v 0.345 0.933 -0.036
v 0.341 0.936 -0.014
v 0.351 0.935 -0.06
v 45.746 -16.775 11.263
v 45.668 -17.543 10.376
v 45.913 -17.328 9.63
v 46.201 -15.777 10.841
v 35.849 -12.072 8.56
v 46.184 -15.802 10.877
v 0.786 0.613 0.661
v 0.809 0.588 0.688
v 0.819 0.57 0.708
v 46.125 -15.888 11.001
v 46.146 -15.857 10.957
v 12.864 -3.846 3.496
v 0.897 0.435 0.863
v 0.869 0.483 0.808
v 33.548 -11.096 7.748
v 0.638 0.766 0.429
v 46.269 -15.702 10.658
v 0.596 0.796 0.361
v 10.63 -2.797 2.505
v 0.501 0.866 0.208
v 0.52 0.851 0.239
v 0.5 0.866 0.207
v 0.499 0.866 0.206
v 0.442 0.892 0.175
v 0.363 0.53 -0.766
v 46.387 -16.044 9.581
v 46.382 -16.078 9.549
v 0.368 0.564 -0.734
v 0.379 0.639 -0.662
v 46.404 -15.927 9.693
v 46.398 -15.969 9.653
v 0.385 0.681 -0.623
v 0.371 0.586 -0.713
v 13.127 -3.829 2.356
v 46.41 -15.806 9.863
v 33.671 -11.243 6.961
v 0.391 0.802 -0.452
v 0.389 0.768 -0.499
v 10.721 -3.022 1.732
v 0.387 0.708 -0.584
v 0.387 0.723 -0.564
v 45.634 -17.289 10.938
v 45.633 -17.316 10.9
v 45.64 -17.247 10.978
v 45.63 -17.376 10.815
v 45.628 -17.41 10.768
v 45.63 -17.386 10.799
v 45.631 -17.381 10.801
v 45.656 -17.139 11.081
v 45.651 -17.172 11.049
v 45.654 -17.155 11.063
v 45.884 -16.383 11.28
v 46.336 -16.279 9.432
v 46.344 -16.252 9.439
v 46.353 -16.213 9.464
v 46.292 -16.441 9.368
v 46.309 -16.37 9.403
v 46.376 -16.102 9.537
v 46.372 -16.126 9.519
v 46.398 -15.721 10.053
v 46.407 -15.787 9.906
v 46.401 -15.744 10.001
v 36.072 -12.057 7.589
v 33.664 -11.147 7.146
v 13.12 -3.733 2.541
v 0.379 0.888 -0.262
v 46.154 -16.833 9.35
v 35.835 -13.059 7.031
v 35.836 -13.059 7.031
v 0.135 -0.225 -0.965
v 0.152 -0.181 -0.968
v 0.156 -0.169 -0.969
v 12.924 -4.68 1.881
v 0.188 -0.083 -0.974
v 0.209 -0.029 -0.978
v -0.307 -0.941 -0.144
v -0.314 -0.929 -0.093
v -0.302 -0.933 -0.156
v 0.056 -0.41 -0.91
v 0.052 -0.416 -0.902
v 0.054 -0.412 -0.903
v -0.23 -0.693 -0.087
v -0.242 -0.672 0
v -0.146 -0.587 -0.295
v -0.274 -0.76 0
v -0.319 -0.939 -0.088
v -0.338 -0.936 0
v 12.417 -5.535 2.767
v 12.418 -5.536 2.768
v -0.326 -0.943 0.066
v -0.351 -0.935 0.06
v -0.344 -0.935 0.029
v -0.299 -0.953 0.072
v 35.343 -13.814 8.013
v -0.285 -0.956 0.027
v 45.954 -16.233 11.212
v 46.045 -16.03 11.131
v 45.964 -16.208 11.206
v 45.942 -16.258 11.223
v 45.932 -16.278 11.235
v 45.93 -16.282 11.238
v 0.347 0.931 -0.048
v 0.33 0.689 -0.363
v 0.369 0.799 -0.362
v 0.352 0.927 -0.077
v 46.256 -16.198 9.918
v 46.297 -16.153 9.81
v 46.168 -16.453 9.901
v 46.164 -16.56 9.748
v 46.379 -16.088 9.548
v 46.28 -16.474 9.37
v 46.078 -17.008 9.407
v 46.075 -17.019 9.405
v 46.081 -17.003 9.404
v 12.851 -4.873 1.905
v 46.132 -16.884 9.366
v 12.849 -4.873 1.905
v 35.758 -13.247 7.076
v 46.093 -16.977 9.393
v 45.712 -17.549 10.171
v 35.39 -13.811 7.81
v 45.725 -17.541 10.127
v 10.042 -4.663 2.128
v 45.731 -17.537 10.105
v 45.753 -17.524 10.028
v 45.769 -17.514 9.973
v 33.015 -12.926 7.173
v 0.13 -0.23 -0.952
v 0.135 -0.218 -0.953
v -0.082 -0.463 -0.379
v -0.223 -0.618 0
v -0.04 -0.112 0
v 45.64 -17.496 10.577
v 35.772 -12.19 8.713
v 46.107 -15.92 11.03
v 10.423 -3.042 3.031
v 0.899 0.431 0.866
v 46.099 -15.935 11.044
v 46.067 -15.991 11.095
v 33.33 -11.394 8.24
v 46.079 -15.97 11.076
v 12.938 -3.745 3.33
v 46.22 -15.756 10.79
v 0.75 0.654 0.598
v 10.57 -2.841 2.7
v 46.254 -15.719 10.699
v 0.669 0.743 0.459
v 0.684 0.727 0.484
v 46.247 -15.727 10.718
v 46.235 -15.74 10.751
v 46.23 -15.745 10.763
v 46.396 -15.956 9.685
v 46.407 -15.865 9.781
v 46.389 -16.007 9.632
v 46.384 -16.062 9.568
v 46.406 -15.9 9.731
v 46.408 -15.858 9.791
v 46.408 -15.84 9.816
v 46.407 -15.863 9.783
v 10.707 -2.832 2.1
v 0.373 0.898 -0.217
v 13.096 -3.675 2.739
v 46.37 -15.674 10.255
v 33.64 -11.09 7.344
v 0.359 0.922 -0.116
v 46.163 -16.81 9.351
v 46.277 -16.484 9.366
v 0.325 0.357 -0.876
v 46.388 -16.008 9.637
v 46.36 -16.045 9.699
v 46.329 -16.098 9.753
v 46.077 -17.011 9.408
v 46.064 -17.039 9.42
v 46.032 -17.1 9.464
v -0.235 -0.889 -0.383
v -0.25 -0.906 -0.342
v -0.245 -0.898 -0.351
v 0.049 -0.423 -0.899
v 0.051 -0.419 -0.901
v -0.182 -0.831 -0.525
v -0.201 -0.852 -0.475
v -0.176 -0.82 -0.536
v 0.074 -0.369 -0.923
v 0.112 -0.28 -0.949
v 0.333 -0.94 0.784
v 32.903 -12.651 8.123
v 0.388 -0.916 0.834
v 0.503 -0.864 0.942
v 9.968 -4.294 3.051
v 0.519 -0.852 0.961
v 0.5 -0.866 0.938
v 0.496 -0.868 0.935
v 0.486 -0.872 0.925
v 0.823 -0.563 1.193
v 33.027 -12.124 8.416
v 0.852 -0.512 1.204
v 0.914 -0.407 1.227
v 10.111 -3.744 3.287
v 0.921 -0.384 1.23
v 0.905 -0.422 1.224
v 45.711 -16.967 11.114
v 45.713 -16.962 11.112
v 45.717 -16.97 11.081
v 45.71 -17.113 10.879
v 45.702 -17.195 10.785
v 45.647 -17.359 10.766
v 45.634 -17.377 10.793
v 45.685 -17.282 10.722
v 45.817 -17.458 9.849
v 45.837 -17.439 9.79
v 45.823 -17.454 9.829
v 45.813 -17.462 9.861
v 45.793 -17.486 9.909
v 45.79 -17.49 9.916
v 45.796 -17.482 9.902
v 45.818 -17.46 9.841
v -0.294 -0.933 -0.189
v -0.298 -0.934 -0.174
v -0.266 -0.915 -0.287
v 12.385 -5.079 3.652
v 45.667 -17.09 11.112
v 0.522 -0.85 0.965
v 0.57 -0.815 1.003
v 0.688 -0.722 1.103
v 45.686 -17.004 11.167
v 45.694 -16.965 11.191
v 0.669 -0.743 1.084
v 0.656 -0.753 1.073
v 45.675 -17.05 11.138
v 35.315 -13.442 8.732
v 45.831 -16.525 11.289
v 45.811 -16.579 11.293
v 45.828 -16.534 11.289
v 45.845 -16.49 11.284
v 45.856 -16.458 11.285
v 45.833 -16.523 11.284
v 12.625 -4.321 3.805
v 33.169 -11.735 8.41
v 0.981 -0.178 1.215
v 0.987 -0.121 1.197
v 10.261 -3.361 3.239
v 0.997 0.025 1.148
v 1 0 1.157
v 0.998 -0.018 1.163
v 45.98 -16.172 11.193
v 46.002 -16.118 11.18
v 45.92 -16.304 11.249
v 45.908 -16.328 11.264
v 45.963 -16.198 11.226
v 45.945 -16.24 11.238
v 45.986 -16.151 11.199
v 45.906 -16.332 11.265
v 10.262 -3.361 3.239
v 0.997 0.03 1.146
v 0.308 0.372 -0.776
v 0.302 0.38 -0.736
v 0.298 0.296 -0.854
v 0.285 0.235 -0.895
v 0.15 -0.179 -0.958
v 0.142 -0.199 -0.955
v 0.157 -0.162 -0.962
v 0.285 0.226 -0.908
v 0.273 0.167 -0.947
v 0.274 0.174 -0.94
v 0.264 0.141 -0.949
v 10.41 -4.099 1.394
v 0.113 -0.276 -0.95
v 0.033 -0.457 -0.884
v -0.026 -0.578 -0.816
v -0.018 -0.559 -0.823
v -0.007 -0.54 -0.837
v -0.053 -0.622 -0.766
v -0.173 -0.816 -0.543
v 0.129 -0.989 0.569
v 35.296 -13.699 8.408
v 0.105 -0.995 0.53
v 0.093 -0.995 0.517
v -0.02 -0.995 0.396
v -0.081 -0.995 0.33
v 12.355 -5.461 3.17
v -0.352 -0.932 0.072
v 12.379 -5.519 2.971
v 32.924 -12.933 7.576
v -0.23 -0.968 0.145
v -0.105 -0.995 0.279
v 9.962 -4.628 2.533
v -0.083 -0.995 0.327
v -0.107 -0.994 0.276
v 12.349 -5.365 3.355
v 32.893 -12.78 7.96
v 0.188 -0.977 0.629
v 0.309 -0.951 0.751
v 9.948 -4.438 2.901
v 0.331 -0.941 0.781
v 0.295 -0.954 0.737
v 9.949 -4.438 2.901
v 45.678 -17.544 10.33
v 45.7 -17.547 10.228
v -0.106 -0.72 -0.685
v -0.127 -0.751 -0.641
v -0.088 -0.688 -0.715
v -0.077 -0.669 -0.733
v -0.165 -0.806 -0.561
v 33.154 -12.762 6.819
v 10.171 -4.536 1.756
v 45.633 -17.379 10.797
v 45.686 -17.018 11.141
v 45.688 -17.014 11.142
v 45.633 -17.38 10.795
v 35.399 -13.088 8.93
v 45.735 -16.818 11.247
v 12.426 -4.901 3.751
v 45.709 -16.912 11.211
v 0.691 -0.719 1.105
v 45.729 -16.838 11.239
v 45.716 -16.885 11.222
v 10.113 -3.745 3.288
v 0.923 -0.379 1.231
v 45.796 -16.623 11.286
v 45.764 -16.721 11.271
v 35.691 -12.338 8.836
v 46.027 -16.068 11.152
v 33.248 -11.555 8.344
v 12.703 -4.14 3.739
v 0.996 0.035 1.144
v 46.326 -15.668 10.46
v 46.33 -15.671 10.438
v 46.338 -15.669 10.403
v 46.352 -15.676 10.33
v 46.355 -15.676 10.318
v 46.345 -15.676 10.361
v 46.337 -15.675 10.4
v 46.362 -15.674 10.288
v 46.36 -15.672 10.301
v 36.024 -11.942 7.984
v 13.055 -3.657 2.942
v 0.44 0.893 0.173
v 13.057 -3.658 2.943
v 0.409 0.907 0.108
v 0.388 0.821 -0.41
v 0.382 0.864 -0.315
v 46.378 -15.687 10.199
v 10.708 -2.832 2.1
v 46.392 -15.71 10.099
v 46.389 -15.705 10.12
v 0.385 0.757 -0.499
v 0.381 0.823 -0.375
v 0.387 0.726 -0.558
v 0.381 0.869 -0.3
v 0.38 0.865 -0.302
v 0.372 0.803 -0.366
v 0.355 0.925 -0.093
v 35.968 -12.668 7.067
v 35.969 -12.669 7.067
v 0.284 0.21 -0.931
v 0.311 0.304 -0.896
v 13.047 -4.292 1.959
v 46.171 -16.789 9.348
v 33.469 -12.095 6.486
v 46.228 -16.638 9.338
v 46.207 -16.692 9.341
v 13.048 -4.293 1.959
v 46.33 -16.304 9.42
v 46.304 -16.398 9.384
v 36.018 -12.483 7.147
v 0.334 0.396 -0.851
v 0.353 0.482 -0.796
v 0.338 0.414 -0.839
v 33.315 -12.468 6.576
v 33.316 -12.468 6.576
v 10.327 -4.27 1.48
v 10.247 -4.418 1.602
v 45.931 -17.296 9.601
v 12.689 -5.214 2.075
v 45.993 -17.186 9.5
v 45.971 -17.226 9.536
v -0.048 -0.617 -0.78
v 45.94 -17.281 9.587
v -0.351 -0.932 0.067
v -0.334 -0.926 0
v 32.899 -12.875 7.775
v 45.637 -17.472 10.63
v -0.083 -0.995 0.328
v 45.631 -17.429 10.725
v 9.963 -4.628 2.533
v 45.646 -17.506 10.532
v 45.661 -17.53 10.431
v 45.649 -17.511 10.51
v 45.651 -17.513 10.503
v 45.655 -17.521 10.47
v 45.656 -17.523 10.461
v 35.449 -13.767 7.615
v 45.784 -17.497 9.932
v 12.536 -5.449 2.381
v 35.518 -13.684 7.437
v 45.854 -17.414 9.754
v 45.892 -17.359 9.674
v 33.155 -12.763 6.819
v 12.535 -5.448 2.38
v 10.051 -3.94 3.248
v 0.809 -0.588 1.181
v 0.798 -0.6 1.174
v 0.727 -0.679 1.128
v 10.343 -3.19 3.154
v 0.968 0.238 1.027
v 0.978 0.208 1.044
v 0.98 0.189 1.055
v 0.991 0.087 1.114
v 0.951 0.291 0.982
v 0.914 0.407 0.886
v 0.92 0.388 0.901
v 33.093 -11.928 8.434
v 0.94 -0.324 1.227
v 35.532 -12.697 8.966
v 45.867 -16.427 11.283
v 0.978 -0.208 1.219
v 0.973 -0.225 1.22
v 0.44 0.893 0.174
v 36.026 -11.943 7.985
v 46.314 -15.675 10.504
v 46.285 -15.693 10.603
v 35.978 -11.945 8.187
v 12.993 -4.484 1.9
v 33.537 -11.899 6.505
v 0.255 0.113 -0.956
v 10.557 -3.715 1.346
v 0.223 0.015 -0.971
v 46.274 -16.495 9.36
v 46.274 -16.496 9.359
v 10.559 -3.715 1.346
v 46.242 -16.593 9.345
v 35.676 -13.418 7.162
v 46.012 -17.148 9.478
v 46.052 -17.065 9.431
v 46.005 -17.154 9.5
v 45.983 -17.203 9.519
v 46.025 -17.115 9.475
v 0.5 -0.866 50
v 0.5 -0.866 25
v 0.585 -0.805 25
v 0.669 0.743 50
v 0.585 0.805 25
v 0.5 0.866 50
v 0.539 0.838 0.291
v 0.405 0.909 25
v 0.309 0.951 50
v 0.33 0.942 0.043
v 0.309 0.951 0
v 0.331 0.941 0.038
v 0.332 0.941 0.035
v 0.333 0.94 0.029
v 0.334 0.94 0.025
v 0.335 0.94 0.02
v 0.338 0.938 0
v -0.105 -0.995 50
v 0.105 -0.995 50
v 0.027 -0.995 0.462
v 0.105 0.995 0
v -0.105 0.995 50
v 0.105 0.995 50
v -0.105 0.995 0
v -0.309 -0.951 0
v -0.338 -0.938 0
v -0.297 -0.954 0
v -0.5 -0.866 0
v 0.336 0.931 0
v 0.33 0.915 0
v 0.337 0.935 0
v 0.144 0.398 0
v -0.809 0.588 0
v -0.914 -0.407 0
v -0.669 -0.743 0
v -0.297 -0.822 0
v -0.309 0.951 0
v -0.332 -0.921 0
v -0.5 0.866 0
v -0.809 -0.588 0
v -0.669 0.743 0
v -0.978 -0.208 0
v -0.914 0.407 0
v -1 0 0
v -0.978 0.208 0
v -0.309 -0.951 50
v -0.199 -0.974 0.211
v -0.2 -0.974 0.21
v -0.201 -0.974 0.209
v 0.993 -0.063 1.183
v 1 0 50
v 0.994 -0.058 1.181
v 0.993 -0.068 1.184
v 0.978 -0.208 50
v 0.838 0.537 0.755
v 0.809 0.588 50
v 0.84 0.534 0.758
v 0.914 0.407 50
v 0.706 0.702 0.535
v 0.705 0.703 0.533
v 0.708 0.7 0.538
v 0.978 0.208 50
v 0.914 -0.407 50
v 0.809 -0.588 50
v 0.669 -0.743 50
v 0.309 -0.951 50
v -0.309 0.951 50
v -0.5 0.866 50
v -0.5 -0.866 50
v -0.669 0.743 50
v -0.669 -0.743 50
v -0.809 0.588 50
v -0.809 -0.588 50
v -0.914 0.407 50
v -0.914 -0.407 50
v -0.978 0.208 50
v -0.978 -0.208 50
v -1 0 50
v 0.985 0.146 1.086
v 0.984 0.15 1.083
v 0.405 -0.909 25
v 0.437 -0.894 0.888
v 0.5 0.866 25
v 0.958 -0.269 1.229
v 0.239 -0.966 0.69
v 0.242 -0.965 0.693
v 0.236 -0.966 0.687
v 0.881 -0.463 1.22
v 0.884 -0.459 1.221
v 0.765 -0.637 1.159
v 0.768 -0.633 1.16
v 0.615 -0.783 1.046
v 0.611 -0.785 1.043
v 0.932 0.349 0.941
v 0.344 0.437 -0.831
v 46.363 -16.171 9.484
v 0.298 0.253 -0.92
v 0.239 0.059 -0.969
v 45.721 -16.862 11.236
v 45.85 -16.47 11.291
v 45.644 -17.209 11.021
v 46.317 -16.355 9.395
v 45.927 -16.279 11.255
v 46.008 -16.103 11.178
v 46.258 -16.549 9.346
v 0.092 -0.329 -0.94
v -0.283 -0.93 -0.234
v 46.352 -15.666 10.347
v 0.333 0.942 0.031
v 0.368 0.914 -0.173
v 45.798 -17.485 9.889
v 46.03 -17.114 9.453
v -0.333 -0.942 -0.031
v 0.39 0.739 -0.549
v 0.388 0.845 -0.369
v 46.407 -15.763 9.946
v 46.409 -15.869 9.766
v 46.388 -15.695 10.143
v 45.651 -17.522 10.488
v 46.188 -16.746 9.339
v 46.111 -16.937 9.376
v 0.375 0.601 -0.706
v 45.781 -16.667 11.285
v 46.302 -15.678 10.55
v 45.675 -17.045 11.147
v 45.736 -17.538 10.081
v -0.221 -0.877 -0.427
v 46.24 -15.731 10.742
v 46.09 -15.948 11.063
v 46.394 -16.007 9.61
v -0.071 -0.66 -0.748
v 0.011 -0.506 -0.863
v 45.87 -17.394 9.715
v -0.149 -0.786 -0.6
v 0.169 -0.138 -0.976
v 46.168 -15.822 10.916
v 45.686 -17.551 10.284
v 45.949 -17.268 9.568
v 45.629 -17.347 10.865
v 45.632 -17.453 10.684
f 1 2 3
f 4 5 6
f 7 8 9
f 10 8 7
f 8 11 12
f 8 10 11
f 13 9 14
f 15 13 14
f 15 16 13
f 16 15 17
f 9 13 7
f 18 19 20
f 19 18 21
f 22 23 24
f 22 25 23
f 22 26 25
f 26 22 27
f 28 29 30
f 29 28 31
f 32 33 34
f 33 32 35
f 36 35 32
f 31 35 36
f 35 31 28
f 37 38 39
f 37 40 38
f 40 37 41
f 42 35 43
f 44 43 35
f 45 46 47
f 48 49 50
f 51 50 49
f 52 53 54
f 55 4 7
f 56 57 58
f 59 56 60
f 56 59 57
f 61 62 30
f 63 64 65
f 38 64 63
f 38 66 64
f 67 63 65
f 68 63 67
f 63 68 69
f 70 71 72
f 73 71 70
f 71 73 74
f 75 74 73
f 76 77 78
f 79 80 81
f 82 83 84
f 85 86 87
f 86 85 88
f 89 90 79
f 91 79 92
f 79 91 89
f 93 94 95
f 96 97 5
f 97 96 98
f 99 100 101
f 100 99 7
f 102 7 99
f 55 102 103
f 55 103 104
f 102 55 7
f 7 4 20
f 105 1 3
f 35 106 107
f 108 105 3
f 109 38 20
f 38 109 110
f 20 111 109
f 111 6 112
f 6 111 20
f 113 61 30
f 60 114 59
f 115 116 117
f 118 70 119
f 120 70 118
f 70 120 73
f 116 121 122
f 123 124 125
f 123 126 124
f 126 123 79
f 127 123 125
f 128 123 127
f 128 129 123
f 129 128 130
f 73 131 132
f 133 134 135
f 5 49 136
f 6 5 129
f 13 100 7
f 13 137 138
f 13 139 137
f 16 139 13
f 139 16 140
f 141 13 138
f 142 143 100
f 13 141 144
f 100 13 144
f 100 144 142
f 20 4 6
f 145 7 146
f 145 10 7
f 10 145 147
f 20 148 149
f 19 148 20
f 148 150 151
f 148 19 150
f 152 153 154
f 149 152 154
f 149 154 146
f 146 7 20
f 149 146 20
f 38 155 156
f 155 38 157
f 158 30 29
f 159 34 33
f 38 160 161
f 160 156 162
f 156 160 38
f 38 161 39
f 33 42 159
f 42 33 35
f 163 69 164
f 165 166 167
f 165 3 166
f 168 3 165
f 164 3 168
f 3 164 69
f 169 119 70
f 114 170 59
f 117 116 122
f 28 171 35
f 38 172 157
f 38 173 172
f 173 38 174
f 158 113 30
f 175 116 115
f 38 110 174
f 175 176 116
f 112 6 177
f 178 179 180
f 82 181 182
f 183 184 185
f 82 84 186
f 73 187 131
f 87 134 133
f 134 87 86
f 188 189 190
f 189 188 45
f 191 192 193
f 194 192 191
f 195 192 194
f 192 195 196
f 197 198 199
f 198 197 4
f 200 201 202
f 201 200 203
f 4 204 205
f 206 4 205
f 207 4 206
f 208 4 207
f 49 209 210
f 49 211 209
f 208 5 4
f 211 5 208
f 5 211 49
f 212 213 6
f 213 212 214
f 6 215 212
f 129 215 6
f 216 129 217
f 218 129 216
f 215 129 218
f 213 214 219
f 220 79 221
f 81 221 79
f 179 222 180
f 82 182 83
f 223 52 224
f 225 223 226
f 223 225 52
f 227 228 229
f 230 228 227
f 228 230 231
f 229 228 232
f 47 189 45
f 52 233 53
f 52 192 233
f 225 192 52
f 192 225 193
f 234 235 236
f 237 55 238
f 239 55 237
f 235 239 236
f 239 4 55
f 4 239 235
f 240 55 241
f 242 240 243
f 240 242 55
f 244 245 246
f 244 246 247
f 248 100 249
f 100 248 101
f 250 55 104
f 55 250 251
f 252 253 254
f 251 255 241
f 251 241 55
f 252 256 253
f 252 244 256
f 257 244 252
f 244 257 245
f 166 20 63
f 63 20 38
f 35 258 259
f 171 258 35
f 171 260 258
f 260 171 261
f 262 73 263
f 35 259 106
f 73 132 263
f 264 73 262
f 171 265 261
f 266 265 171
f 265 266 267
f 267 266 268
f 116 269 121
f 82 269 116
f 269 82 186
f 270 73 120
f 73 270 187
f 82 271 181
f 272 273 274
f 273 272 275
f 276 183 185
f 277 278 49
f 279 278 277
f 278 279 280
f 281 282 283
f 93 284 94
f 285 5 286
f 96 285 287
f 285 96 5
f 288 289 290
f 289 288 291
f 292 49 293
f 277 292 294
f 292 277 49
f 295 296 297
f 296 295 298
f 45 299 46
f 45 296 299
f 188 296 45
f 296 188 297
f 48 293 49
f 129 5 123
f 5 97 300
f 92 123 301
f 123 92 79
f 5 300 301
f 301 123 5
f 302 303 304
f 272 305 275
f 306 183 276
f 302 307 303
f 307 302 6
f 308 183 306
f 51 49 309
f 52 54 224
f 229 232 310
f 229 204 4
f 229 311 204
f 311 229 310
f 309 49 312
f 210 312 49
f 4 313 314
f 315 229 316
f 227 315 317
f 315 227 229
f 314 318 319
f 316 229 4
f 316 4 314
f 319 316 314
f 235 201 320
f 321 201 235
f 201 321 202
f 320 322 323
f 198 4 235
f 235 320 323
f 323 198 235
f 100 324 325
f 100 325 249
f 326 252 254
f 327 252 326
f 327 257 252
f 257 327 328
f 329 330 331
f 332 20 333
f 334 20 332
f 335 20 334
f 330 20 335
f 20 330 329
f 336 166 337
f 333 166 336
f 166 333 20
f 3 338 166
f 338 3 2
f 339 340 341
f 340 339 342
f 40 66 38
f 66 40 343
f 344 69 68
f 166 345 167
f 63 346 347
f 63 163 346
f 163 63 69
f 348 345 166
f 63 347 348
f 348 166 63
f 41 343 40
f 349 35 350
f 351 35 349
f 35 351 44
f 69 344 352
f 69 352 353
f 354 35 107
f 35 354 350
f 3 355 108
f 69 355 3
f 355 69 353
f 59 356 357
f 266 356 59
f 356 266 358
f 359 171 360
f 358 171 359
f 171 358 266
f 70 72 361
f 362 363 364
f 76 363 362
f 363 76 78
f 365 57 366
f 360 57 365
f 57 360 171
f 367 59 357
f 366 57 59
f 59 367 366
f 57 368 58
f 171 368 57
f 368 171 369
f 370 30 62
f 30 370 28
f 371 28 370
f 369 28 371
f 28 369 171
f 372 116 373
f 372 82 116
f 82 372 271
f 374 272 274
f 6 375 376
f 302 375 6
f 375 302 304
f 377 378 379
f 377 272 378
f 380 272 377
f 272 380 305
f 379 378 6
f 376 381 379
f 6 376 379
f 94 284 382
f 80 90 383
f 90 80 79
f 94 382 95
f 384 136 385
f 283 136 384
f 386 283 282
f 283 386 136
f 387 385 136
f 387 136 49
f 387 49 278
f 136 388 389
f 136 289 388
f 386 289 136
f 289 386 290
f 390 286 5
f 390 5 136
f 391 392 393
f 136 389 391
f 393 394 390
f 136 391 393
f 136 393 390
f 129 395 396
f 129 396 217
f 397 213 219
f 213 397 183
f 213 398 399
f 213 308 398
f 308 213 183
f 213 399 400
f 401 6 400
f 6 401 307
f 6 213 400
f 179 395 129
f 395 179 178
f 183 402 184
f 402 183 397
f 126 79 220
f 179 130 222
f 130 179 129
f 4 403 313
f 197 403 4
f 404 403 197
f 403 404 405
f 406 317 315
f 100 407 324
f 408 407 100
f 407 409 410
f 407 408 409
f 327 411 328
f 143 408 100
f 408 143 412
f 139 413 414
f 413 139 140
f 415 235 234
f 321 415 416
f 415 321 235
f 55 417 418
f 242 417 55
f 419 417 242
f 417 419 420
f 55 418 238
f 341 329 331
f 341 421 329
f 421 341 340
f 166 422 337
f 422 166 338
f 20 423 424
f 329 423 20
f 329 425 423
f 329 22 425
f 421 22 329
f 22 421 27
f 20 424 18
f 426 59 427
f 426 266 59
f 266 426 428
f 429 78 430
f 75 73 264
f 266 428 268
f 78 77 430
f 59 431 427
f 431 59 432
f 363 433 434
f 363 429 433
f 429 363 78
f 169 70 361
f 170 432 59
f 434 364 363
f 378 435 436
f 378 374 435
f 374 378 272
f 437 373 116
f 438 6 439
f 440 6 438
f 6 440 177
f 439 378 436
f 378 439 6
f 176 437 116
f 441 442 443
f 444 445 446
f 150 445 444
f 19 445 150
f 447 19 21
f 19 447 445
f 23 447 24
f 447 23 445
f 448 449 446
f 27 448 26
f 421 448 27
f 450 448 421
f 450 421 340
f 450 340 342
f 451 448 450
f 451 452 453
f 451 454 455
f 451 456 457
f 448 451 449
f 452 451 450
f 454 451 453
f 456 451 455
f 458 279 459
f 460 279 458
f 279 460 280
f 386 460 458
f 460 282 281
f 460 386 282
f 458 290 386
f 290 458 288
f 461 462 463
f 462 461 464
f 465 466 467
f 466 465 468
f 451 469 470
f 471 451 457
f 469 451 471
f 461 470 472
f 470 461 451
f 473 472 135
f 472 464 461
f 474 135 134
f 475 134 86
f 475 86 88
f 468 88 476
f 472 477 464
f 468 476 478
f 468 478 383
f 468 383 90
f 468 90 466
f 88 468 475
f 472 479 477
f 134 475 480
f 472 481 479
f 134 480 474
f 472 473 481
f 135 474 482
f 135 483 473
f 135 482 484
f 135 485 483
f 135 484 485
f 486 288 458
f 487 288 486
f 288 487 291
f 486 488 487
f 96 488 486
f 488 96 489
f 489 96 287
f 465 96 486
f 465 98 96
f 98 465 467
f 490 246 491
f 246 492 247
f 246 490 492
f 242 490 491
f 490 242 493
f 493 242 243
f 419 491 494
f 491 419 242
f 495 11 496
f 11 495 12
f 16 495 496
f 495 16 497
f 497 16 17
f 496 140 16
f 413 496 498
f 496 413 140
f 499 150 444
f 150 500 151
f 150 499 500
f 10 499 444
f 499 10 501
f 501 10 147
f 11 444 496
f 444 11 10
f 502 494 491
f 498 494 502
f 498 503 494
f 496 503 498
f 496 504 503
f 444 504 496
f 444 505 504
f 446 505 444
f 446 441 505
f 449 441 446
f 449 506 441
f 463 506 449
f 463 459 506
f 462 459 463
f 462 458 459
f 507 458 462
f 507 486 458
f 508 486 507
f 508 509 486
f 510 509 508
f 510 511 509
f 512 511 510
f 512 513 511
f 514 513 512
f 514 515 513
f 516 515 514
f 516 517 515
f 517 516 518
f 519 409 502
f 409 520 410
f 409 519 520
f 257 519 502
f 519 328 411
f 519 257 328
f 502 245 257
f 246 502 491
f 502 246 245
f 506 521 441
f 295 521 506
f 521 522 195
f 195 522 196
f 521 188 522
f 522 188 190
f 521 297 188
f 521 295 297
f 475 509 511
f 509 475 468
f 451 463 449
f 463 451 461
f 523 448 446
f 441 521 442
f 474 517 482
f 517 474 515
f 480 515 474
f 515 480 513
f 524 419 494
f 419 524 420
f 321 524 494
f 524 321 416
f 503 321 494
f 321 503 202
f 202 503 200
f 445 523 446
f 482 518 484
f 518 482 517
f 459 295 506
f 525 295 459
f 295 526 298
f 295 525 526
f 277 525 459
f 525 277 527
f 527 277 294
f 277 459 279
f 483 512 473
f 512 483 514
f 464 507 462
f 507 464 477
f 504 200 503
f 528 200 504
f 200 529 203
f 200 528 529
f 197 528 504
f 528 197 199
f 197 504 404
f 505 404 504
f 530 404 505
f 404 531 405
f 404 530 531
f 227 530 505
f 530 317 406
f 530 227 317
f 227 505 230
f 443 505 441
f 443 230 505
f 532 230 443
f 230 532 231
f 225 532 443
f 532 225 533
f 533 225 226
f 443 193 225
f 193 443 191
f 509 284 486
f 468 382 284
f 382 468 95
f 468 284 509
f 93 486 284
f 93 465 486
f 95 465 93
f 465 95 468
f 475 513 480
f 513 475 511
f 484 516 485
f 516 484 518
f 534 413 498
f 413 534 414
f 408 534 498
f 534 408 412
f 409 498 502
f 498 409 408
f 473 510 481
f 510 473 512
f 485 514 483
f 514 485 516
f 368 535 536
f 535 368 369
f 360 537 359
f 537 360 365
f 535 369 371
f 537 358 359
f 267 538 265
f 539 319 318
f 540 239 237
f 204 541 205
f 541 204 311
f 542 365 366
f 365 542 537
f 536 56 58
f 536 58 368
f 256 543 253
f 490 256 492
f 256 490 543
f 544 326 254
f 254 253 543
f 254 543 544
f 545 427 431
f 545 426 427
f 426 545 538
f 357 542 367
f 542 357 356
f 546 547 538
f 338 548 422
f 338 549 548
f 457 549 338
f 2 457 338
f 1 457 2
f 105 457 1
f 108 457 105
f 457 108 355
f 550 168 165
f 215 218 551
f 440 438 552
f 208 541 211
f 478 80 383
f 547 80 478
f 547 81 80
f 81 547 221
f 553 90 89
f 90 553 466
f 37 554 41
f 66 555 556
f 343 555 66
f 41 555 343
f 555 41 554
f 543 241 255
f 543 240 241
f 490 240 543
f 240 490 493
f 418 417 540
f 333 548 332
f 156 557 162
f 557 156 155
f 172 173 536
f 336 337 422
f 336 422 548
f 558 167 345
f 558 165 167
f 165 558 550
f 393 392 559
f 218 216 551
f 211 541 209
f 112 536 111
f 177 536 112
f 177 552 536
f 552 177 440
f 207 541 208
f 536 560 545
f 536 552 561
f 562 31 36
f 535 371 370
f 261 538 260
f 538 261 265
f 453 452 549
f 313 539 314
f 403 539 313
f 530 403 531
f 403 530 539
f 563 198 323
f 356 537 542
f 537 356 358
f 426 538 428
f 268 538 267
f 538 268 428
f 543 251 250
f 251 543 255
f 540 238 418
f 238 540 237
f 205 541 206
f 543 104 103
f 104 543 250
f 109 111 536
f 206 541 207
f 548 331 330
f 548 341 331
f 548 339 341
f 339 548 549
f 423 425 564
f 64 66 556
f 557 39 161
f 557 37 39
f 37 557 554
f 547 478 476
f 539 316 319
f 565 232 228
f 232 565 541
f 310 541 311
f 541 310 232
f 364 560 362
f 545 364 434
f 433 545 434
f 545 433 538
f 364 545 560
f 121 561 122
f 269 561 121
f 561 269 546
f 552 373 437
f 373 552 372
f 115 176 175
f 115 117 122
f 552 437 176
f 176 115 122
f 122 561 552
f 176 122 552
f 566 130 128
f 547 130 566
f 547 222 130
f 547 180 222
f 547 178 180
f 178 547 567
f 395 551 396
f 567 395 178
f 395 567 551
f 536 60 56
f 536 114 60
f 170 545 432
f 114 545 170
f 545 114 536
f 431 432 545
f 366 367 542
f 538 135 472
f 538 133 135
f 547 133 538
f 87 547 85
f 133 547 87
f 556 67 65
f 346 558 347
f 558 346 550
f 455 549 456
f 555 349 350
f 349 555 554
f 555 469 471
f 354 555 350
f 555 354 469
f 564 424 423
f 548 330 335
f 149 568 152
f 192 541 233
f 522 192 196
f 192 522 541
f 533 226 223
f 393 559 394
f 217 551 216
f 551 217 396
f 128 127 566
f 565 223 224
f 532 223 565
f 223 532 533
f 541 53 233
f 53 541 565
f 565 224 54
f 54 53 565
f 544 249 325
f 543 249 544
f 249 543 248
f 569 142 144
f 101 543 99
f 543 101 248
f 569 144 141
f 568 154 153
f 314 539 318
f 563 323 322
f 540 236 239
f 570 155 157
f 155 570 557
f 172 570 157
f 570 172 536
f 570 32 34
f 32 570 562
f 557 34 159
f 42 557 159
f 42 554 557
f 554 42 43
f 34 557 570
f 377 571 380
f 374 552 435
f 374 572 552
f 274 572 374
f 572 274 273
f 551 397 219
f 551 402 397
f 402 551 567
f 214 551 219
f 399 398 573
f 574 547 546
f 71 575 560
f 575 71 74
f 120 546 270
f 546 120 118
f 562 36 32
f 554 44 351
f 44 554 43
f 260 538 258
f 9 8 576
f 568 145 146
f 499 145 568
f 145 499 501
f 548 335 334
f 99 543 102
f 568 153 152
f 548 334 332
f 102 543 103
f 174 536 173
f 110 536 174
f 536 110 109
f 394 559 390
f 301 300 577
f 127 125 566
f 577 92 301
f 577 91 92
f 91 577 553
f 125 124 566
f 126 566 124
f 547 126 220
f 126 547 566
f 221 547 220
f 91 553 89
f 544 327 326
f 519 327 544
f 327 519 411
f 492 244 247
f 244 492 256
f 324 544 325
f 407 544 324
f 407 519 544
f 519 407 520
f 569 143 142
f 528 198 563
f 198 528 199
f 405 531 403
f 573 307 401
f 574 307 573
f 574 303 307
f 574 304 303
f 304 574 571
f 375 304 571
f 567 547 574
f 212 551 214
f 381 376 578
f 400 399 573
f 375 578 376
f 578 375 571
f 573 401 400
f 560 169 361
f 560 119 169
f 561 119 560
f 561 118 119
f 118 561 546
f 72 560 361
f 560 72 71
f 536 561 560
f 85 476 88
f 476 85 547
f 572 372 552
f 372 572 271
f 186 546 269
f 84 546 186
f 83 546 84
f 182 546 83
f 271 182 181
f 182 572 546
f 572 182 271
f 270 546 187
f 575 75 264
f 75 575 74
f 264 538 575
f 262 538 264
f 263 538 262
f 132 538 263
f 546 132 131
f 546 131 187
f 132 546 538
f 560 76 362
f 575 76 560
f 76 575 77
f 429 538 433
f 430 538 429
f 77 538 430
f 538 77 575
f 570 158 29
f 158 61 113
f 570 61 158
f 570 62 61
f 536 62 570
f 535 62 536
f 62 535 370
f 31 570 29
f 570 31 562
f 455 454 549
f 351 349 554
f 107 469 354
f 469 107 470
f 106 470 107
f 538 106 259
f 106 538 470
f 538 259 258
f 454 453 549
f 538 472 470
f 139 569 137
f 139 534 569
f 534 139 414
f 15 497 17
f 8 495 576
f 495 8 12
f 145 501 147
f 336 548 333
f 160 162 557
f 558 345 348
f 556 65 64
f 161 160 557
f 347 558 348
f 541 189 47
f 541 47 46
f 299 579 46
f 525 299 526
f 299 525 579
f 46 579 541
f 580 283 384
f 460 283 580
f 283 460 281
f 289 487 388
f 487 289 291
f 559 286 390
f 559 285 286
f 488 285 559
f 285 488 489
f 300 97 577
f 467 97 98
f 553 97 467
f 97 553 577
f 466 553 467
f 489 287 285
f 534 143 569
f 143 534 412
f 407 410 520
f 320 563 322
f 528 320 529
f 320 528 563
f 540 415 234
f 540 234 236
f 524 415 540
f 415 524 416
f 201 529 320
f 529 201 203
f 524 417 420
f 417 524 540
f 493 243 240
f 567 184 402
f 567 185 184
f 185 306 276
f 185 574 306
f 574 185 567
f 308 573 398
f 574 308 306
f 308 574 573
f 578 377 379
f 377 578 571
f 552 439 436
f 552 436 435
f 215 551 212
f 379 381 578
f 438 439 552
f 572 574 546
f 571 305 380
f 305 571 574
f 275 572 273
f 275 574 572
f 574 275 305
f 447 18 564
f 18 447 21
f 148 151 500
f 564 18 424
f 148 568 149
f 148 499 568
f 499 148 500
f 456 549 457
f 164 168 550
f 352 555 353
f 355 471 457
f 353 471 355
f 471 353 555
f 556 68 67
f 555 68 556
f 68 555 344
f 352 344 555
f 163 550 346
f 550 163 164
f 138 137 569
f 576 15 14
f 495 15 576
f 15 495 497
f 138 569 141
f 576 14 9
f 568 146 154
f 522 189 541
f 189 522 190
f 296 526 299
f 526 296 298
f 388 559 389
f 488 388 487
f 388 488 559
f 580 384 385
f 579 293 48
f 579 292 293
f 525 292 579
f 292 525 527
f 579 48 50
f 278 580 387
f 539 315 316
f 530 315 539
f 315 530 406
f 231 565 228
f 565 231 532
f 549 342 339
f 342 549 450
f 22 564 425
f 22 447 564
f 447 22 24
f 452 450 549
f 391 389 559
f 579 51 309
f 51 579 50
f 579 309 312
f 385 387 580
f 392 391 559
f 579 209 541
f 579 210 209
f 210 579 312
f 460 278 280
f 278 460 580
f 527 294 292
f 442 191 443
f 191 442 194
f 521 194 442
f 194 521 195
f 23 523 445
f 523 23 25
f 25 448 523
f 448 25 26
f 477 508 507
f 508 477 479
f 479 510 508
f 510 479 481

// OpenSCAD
function cvar(a)=
let(
text=a[0],
b=search("-",a)!=[]&&search(".",a)!=[]?[for(i=[2:len(a)-1])if(a[i]!=".")a[i]]:
search("-",a)!=[]&&search(".",a)==[]?[for(i=[2:len(a)-1])a[i]]:
search("-",a)==[]&&search(".",a)!=[]?[for(i=[1:len(a)-1])if(a[i]!=".")a[i]]:[for(i=[1:len(a)-1])a[i]],
n=[["0"],["1"],["2"],["3"],["4"],["5"],["6"],["7"],["8"],["9"]],
l=len(b),
c=[for(i=[0:l-1])each search(b[i],n)],
d=[for(i=[0:len(c)-1])10^(l-i-1)],
e=c*d,
f=search(".",a)!=[]&&search("-",a)!=[]?e*10^-(l-(search(".",a)[0]-2)):search(".",a)!=[]&&search("-",a)==[]?e*10^-(l-(search(".",a)[0]-1)):e,
g=search("-",a)!=[]?f*-1:f
)[text,g];

//function to rotate a point around a vector(axis) with angle theta           
function q(vector=[1,0,0],point=[0,5,0],theta=0)=

let(t=theta,
v=vector/norm(vector),
p=[cos(t/2),v*sin(t/2)],
p1=[p.x,-p.y],
q=[0,len(point)==2?[point.x,point.y,0]:point],
pq=[p.x*q.x-p.y*q.y,p.x*q.y+p.y*q.x+cross(p.y,q.y)],
pqp1=[pq.x*p1.x-pq.y*p1.y,pq.x*p1.y+pq.y*p1.x+cross(pq.y,p1.y)],
transformation=pqp1.y
)

transformation
;
// function is input to another function q_rot
function qmr1(s,r,pl,n=0)= n==len(s)?pl:
qmr1(s,r,
    let(
    v1=s[n]=="x"?[1,0,0]:s[n]=="y"?[0,1,0]:[0,0,1],
    r1=r[n]==undef?0:r[n])
    [for(p=pl)q(v1,p,r1)],n+1);
//function is input to another function q_rot
function qmr2(s,r,pl,n=0)= n==len(s)?pl:qmr2(s,r,let(
    v1=s[n]=="x"?[1,0,0]:s[n]=="y"?[0,1,0]:[0,0,1],
    r1=r[n]==undef?0:r[n])
[for(i=[0:len(pl)-1])[for(p=pl[i])q(v1,p,r1)]],n+1);
  
//function to rotate a group of points "pl" around a series of axis with defined angles e.g q_rot(s=["z20","x40","y80"],pl=[[2,0],[10,2]])=> will rotate the line first around z axis by 20 deg then around x axis by 40 degrees and then around y axis by 80 degrees.  
function q_rot(s,pl)= is_num(pl[0][0])?qmr1([for(p=s)cvar(p)[0]],[for(p=s)cvar(p)[1]],pl):qmr2([for(p=s)cvar(p)[0]],[for(p=s)cvar(p)[1]],pl);


function equivalent_rot_axis(r1=[])=
let(
vz=[0,0,1],
v1=q_rot(r1,[vz])[0],
v2=cross(vz,v1),
theta=acos(vz*v1/norm(v1))
)
[theta,v2];



//original openscad method of rotating the objects

rotate([0,45,0])
rotate([70,0,0])
rotate([0,10,0])
rotate([30,40,100])
cylinder(h=50,$fn=30);


//original openscad method of reverse rotating the objects
rotate([-30,0,0])
rotate([0,-40,0])
rotate([0,0,-100])
rotate([0,-10,0])
rotate([-70,0,0])
rotate([0,-45,0])


rotate([0,45,0])
rotate([70,0,0])
rotate([0,10,0])
rotate([30,40,100])

cylinder(h=50,$fn=30);

// equivalent rotation axis method of rotation
r1=["x30","y40","z100","y10","x70","y45"];
a=equivalent_rot_axis(r1);
color("magenta")
rotate(a.x,a.y)
cylinder(h=50,$fn=30);


// equivalent rotation axis method of reverse rotation

color("blue")
rotate(-a.x,a.y)
rotate(a.x,a.y)
cylinder(h=50,$fn=30);
